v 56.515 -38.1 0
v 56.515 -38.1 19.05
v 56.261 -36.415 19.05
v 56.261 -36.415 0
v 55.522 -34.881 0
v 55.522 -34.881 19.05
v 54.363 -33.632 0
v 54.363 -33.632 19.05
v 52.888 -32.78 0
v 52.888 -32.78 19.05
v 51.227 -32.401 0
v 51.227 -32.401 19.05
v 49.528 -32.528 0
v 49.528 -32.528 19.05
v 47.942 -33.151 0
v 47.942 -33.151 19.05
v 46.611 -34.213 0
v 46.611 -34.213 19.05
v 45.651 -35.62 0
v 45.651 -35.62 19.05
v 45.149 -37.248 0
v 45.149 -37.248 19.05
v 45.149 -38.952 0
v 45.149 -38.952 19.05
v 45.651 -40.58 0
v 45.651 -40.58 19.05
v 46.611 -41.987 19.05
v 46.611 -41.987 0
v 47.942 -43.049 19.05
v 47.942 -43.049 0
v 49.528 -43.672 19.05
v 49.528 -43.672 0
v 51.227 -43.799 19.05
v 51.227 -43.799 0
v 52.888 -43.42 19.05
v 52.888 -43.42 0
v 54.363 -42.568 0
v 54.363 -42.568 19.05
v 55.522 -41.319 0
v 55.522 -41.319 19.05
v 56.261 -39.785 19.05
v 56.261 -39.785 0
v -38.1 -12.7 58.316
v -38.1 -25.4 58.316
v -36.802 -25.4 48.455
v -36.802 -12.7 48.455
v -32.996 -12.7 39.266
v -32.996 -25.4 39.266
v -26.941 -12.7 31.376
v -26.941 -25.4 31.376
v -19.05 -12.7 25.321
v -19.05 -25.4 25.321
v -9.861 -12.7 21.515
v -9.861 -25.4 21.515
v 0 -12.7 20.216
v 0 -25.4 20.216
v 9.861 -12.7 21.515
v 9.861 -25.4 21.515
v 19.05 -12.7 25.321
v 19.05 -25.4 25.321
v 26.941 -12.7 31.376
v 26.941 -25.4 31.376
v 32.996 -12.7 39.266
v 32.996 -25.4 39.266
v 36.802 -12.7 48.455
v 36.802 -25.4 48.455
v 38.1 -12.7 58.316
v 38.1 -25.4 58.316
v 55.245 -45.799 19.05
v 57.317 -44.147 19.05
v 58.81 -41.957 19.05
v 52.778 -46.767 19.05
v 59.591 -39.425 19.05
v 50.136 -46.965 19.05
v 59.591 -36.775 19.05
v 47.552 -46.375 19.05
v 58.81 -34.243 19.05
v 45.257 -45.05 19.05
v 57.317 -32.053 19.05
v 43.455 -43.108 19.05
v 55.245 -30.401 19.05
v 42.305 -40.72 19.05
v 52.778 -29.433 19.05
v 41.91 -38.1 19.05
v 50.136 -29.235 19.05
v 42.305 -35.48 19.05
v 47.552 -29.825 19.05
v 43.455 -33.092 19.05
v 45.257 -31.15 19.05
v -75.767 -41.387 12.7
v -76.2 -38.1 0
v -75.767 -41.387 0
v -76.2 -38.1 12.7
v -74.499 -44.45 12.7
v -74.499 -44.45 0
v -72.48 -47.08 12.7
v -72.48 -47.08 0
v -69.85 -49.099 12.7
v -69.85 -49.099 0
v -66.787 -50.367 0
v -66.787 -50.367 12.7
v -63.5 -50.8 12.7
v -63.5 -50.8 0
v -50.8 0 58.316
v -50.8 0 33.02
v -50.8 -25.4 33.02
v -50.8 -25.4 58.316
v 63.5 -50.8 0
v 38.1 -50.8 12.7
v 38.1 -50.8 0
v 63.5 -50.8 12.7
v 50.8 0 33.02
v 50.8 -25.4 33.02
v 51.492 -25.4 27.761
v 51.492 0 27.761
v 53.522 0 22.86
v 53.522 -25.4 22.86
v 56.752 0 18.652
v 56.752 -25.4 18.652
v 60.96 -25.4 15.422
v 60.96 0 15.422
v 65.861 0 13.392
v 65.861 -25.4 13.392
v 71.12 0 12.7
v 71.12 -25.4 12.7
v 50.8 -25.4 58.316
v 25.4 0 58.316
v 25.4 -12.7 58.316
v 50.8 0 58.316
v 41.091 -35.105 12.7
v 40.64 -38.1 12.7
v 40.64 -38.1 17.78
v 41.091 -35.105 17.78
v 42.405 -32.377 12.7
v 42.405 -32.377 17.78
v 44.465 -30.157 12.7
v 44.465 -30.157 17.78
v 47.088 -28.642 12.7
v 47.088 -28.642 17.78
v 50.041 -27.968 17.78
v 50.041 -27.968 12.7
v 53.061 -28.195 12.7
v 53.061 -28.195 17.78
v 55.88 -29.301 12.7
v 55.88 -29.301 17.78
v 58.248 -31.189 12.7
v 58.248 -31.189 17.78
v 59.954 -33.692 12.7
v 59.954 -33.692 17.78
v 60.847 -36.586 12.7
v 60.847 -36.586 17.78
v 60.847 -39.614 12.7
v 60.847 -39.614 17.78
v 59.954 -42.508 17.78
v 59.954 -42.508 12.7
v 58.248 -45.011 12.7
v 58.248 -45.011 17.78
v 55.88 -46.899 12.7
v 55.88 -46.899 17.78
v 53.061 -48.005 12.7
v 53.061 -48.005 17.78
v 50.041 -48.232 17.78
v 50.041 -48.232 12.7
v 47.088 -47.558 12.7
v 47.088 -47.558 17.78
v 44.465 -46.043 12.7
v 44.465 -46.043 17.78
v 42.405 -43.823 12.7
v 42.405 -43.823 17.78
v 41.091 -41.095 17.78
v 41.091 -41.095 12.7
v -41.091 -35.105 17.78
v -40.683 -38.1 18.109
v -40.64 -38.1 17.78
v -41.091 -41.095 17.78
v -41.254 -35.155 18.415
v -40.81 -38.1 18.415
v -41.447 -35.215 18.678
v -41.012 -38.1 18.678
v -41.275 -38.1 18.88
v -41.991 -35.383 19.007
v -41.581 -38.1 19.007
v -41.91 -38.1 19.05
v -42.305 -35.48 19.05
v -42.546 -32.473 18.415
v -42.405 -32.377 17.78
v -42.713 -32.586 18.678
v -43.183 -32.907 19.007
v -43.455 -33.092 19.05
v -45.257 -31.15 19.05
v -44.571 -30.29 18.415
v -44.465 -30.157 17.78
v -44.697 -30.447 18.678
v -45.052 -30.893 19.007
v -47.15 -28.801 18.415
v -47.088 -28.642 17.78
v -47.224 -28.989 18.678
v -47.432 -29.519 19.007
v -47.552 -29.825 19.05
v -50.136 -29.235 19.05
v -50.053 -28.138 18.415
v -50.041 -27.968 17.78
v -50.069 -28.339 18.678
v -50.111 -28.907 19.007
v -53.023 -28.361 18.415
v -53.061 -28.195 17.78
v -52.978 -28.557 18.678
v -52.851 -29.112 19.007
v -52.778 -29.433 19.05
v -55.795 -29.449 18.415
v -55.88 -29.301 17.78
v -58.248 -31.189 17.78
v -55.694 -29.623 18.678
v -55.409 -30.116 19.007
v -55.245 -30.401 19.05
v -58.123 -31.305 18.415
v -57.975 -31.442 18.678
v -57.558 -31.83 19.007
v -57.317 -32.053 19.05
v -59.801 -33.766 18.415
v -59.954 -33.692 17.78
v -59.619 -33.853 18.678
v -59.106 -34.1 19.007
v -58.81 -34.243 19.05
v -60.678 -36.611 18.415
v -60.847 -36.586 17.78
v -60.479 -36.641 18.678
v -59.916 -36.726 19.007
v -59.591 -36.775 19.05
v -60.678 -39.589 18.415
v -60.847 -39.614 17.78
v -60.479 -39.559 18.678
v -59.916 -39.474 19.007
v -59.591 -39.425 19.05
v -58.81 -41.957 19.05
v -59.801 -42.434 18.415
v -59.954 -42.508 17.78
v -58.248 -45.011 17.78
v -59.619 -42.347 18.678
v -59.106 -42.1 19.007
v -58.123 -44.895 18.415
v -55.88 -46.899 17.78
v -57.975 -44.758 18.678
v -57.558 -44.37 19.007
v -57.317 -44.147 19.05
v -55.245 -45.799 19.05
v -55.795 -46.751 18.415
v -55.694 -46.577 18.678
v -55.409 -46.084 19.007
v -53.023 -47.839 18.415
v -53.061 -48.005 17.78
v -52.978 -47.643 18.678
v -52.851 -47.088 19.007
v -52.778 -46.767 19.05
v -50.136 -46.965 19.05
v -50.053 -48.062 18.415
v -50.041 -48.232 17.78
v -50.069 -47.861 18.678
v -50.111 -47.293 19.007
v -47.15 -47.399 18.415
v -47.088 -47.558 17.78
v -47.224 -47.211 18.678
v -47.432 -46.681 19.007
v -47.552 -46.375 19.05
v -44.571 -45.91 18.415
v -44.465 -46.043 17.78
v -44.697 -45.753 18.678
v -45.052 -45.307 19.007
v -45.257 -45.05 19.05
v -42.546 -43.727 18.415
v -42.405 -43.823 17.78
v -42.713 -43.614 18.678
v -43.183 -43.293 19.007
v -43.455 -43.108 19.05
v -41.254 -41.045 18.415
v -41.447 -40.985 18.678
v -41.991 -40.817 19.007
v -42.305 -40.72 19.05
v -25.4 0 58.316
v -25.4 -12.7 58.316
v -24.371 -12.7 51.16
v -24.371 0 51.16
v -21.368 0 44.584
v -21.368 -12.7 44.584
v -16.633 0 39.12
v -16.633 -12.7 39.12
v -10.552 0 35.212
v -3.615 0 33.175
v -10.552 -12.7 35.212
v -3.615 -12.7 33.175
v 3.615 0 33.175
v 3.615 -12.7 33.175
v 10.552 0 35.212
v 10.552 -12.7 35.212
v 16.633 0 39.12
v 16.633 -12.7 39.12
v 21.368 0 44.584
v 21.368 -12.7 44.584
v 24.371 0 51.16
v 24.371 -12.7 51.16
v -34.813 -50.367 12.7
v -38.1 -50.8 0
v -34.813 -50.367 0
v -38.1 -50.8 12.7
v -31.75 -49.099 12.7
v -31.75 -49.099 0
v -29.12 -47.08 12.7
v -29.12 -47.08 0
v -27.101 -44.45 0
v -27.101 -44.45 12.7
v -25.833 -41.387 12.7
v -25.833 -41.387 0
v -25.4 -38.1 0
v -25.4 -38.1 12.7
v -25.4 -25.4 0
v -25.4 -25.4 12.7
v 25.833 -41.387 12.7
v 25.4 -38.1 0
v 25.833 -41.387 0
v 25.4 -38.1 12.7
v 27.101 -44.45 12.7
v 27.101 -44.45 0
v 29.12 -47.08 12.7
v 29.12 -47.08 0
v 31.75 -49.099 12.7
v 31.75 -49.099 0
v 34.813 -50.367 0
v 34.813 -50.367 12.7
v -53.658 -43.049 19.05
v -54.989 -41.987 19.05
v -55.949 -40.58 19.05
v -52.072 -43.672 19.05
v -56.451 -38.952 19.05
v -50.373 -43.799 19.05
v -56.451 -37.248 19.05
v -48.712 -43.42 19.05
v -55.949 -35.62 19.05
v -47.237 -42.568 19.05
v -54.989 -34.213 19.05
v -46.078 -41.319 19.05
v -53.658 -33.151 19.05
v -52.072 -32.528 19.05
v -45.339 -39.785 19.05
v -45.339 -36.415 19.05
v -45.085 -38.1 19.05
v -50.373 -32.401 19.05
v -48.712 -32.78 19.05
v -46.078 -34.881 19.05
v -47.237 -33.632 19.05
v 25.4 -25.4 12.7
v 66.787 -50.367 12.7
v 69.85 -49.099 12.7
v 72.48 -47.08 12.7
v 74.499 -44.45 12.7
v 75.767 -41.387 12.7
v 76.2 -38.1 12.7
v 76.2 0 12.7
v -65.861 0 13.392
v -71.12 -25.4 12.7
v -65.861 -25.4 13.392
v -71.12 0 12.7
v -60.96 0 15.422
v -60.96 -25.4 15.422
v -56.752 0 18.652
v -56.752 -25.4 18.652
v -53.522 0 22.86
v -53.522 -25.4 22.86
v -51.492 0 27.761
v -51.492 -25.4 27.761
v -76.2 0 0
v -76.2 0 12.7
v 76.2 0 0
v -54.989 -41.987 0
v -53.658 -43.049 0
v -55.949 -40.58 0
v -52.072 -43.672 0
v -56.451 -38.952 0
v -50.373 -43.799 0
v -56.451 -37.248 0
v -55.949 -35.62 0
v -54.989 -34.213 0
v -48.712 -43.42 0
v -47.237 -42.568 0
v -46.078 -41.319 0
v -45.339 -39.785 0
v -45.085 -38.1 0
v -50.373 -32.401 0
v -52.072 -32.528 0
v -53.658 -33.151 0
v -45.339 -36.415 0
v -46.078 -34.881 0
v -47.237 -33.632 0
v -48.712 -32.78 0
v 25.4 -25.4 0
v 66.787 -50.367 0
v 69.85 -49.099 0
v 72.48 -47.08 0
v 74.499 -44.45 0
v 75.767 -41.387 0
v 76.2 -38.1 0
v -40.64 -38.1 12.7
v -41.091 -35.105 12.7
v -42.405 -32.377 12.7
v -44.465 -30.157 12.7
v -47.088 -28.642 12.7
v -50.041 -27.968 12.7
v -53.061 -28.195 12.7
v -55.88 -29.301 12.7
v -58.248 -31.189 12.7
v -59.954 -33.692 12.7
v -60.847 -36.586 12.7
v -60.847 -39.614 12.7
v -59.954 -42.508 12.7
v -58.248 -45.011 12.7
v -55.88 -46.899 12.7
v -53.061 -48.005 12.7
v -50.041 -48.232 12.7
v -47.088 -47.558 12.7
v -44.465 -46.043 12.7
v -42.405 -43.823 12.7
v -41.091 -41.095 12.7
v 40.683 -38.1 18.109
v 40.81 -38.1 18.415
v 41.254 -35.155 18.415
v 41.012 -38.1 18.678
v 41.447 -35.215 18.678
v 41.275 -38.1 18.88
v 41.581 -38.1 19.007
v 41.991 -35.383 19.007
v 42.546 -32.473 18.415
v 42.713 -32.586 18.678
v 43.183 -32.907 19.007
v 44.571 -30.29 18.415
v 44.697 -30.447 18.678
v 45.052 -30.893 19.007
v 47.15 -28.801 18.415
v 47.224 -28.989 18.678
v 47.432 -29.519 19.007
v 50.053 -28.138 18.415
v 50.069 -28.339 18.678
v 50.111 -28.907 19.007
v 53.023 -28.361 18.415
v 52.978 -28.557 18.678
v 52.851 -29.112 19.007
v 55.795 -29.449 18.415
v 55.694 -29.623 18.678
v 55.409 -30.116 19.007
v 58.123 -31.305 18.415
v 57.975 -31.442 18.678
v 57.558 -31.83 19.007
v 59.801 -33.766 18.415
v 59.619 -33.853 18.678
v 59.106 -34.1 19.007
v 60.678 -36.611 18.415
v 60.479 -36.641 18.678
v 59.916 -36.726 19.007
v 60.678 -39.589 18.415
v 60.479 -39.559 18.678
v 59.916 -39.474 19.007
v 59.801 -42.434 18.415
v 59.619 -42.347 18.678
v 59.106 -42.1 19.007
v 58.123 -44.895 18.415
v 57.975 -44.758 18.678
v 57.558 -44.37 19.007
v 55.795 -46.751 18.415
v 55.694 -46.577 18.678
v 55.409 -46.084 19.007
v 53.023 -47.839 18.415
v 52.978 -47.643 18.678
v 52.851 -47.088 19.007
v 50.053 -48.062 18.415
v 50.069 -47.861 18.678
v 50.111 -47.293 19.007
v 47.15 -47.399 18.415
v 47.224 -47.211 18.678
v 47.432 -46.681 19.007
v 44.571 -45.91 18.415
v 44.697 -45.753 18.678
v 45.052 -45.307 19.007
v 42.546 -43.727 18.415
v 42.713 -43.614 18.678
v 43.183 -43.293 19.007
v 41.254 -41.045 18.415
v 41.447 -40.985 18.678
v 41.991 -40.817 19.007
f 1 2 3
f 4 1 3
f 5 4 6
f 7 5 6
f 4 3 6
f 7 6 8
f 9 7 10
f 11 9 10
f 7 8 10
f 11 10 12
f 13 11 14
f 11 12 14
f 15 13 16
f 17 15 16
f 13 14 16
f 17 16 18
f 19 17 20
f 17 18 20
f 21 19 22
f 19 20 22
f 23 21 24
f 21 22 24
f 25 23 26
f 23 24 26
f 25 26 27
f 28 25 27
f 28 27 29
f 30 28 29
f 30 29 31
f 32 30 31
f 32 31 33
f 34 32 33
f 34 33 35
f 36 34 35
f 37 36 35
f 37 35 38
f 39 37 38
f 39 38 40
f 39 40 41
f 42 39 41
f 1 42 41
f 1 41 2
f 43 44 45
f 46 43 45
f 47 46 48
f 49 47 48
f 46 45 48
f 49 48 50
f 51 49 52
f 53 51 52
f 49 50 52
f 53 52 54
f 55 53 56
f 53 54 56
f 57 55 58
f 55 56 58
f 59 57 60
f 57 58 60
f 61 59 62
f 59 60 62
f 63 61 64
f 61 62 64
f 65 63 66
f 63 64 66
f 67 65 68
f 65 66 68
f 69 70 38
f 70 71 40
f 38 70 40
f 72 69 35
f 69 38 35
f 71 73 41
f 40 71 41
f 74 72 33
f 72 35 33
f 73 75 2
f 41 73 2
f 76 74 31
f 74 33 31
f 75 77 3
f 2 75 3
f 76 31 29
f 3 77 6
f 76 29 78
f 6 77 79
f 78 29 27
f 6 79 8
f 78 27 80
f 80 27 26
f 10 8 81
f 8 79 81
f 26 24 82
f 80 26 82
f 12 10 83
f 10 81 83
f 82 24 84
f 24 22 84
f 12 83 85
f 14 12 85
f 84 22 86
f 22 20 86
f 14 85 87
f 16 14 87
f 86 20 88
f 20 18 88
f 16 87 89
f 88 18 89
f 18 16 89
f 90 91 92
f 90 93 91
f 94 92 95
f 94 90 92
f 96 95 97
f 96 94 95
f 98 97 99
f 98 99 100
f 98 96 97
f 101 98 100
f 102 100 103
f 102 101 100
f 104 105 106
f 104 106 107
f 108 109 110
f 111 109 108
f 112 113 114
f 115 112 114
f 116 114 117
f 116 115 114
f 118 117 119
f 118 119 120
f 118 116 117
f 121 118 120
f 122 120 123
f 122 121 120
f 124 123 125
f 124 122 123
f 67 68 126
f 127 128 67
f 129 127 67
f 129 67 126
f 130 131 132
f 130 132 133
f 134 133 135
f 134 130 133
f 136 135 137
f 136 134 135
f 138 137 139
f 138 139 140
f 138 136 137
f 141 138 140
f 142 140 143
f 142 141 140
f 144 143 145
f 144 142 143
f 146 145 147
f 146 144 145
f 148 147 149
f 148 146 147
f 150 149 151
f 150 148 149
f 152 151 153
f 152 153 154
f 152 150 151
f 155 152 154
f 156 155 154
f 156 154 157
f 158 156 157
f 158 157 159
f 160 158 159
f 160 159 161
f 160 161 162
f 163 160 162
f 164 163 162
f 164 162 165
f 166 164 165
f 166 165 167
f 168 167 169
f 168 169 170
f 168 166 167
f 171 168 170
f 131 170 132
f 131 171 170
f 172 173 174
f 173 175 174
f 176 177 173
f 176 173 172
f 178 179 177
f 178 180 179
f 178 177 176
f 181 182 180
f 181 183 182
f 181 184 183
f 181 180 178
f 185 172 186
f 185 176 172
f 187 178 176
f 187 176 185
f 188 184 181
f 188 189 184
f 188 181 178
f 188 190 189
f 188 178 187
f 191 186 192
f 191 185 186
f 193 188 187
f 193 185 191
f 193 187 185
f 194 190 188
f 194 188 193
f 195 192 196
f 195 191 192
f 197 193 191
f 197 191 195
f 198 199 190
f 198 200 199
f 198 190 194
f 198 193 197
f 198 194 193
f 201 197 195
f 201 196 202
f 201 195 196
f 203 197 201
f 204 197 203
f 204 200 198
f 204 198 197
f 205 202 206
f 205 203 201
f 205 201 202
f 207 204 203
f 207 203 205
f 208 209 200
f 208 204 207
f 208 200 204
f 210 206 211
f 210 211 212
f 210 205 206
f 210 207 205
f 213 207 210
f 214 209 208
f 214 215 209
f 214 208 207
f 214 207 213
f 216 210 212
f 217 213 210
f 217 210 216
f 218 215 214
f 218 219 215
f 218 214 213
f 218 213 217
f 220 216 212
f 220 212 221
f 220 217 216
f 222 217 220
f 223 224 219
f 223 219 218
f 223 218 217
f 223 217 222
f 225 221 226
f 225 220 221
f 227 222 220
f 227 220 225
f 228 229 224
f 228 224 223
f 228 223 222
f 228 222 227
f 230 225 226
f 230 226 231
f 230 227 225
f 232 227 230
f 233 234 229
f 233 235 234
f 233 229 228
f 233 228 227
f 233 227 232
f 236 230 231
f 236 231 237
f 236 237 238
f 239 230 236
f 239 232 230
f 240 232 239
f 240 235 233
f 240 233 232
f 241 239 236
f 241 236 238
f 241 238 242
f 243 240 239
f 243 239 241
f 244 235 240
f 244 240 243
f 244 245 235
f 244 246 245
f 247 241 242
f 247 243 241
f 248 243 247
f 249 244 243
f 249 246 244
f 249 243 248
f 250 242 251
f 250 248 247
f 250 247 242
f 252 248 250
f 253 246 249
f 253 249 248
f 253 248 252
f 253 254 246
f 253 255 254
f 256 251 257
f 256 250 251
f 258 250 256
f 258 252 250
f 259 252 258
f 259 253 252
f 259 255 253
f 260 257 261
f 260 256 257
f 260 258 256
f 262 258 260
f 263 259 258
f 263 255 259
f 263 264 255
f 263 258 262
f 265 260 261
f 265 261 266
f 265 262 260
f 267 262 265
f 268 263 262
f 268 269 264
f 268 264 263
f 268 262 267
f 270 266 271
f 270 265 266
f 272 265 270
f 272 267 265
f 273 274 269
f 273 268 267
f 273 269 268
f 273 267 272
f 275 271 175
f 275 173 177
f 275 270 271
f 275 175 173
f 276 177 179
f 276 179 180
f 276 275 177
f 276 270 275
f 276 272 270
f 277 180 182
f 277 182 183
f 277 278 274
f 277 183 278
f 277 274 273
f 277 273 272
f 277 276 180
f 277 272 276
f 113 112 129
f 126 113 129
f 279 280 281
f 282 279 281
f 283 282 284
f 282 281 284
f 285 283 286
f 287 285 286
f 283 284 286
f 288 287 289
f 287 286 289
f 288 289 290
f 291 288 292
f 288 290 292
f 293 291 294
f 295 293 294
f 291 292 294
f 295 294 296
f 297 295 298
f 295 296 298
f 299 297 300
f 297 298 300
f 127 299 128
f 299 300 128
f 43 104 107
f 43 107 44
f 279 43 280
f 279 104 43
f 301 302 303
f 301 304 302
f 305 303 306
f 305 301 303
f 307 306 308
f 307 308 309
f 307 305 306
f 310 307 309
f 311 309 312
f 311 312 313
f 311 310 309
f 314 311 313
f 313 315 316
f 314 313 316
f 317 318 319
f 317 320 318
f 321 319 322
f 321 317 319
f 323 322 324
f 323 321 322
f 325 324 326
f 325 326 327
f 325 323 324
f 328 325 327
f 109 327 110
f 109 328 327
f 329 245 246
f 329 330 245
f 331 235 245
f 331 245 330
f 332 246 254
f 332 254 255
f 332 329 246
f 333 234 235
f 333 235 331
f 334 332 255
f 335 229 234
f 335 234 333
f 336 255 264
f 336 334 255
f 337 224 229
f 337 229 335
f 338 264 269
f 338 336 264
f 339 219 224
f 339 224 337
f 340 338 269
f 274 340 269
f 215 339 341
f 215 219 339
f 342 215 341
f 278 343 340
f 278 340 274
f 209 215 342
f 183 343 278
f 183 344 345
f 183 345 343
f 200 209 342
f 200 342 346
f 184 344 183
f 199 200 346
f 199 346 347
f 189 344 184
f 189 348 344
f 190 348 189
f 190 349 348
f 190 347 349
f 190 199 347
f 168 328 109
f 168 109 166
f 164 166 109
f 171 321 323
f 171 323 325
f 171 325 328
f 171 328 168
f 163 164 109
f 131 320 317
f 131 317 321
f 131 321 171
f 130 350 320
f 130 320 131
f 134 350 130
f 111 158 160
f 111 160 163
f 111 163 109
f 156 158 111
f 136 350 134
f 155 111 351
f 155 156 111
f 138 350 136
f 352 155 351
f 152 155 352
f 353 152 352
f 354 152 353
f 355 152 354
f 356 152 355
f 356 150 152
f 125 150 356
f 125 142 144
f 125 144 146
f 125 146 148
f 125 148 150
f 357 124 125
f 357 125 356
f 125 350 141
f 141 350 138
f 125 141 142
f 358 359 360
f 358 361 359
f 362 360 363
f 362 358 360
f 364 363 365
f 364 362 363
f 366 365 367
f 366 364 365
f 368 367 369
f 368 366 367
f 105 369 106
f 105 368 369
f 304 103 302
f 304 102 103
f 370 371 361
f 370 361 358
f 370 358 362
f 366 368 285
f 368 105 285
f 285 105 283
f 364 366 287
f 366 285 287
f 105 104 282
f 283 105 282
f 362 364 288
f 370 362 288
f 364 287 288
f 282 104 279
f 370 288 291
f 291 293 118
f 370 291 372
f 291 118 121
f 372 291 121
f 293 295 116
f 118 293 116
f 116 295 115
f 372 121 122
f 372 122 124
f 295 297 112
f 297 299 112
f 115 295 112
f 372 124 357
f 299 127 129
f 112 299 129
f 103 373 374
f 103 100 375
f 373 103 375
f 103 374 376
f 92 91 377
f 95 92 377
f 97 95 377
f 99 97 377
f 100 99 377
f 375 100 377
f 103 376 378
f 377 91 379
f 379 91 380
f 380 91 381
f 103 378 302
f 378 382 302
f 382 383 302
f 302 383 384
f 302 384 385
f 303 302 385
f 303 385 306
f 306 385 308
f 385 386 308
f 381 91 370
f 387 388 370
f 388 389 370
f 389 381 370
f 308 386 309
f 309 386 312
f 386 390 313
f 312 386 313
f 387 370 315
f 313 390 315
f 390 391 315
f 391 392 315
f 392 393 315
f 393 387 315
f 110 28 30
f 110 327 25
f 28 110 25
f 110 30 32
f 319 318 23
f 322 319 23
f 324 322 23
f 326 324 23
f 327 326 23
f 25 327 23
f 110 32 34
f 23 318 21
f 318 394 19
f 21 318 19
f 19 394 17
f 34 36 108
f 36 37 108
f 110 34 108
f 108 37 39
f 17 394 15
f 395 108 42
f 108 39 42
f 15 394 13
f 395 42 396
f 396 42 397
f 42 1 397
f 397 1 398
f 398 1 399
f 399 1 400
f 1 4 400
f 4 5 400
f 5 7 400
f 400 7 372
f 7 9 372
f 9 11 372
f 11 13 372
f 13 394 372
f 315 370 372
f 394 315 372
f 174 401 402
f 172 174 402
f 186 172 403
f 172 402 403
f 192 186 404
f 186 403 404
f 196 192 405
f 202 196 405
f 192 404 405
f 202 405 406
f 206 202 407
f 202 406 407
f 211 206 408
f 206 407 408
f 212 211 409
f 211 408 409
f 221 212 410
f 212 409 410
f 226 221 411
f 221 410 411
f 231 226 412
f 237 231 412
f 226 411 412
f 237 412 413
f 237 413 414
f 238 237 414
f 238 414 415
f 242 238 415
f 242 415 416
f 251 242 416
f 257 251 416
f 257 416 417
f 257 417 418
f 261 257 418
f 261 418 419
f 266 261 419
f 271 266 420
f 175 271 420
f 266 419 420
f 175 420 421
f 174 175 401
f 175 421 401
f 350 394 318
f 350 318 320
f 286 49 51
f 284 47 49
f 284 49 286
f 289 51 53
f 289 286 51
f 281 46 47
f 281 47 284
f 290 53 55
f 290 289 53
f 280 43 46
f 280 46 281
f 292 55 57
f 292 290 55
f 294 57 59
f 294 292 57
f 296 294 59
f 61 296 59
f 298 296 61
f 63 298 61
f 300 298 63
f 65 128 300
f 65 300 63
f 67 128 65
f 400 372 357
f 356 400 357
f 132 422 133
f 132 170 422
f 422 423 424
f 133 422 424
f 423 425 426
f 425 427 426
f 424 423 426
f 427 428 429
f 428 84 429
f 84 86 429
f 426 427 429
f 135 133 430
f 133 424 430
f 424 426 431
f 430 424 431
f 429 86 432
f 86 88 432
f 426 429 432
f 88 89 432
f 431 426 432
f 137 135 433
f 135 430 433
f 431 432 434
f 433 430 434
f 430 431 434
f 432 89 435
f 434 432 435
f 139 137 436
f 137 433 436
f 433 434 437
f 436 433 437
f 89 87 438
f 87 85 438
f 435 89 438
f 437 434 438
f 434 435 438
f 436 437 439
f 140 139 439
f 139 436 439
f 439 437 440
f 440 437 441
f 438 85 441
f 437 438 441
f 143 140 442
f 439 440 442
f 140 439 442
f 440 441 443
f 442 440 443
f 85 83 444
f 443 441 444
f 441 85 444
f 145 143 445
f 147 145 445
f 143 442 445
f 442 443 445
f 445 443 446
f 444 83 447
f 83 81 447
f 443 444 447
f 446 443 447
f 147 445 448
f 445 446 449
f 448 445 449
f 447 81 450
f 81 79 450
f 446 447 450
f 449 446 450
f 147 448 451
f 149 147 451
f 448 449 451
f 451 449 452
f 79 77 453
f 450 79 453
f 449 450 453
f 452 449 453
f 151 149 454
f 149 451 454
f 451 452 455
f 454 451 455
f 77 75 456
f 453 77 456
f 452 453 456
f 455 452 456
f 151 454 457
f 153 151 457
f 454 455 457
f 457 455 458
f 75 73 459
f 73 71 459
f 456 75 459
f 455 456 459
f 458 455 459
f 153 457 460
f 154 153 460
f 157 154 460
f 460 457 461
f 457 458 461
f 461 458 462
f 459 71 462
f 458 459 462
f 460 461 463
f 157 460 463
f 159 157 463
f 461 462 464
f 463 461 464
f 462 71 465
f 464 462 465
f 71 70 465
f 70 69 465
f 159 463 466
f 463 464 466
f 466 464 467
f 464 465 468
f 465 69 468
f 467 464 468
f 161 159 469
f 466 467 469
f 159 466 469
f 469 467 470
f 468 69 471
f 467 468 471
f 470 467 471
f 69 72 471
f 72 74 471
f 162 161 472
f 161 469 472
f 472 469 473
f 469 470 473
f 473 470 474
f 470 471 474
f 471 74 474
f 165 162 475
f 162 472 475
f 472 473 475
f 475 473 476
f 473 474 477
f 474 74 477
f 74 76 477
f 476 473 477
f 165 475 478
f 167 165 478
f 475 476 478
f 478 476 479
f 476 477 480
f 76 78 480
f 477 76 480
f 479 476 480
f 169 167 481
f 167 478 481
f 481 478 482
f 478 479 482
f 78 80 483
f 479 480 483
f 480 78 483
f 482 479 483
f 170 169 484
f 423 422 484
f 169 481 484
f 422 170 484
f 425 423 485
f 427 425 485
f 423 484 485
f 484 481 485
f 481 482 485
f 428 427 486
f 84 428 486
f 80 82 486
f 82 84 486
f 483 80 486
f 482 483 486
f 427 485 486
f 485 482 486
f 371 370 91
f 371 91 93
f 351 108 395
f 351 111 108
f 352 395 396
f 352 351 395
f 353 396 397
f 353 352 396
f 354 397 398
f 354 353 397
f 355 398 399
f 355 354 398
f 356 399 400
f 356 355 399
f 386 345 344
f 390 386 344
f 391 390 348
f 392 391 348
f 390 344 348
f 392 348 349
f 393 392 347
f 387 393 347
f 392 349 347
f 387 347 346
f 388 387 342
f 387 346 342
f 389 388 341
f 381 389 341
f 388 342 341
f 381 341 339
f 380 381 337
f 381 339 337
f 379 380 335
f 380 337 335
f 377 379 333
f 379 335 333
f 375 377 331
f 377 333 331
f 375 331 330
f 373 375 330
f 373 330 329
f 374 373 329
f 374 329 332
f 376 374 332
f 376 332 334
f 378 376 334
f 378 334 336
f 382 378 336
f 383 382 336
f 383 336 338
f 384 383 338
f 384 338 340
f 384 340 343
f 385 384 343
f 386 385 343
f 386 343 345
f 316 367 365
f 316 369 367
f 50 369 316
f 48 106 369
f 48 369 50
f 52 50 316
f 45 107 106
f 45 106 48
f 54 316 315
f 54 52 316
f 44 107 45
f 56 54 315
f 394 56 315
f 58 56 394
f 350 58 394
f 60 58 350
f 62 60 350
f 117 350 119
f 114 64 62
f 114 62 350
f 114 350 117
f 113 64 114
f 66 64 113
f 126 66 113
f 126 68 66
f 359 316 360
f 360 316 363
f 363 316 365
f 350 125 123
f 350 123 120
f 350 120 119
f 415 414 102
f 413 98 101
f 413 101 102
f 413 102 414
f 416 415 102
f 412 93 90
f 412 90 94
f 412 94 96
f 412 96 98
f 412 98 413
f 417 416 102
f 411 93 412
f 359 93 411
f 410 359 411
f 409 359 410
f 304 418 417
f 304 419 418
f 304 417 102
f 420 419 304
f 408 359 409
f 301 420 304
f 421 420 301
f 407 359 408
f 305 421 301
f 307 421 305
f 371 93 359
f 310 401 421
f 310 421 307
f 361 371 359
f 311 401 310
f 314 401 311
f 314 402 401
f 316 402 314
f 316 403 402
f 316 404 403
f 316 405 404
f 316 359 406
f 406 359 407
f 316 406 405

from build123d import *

# Parameters (mm, degrees)
F0_W      = 101.6
F0_H      = 58.316330242
F2_DEPTH  = 25.4
F1_W      = 50.8
F1_H      = 12.7
F3_DEPTH  = 50.8
F5_R      = 12.7
F4_R      = 10.16
F6_DEPTH  = 6.35
F8_R      = 1.27
F10_DEPTH = 12.7
F12_DEPTH = 12.701
F13_R     = 20.32
F14_R     = 5.715
F15_DEPTH = 19.051


with BuildPart() as f2:
    # F0 (on Front) → F2 (new body)
    with BuildSketch(Plane.XZ):
        with Locations((0, 29.158165121)):
            Rectangle(F0_W, F0_H)
    extrude(amount=F2_DEPTH)

    # F1 (on Front) → F3 (join)
    with BuildSketch(Plane.XZ):
        with Locations((-50.8, 6.35)):
            Rectangle(F1_W, F1_H)
        with Locations((50.8, 6.35)):
            Rectangle(F1_W, F1_H)
    extrude(amount=F3_DEPTH)

    # F5
    f5_edges = [f2.edges().sort_by_distance(p)[0] for p in [
        (-76.2, -50.8, 6.35),
        (-25.4, -50.8, 6.35),
        (25.4, -50.8, 6.35),
        (76.2, -50.8, 6.35),
    ]]
    fillet(f5_edges, radius=F5_R)

    # F4 (on face) → F6 (join)
    with BuildSketch(Plane.XY.offset(12.7)):
        with Locations((-50.8, -38.1)):
            Circle(F4_R)
    extrude(amount=F6_DEPTH)

    # F7: F2 across plane


with BuildPart() as f2_1:
    add(f2.part)
    add(f2.part.mirror(Plane.YZ))

    # F8
    f8_edges = [f2_1.edges().sort_by_distance(p)[0] for p in [
        (-60.96, -38.1, 19.05),
        (60.96, -38.1, 19.05),
    ]]
    fillet(f8_edges, radius=F8_R)

    # F9 (on face) → F10 (cut)
    with BuildSketch(Plane.XZ.offset(25.4)):
        with BuildLine():
            ThreePointArc((-38.1, 58.316330242), (0, 20.216330242), (38.1, 58.316330242))
            Line((38.1, 58.316330242), (-38.1, 58.316330242))
        make_face()
    extrude(amount=-F10_DEPTH, mode=Mode.SUBTRACT)

    # F11 (on face) → F12 (cut, through all)
    with BuildSketch(Plane.XZ.offset(12.7)):
        with BuildLine():
            ThreePointArc((-25.4, 58.316330242), (0, 32.916330242), (25.4, 58.316330242))
            Line((25.4, 58.316330242), (-25.4, 58.316330242))
        make_face()
    extrude(amount=-F12_DEPTH, mode=Mode.SUBTRACT)

    # F13
    f13_edges = [f2_1.edges().sort_by_distance(p)[0] for p in [
        (50.8, -12.7, 12.7),
        (-50.8, -12.7, 12.7),
    ]]
    fillet(f13_edges, radius=F13_R)

    # F14 (on face) → F15 (cut, through all)
    with BuildSketch(Plane.XY.offset(19.05)):
        with Locations((-50.8, -38.1)):
            Circle(F14_R)
        with Locations((50.8, -38.1)):
            Circle(F14_R)
    extrude(amount=-F15_DEPTH, mode=Mode.SUBTRACT)


solid = f2_1.part
